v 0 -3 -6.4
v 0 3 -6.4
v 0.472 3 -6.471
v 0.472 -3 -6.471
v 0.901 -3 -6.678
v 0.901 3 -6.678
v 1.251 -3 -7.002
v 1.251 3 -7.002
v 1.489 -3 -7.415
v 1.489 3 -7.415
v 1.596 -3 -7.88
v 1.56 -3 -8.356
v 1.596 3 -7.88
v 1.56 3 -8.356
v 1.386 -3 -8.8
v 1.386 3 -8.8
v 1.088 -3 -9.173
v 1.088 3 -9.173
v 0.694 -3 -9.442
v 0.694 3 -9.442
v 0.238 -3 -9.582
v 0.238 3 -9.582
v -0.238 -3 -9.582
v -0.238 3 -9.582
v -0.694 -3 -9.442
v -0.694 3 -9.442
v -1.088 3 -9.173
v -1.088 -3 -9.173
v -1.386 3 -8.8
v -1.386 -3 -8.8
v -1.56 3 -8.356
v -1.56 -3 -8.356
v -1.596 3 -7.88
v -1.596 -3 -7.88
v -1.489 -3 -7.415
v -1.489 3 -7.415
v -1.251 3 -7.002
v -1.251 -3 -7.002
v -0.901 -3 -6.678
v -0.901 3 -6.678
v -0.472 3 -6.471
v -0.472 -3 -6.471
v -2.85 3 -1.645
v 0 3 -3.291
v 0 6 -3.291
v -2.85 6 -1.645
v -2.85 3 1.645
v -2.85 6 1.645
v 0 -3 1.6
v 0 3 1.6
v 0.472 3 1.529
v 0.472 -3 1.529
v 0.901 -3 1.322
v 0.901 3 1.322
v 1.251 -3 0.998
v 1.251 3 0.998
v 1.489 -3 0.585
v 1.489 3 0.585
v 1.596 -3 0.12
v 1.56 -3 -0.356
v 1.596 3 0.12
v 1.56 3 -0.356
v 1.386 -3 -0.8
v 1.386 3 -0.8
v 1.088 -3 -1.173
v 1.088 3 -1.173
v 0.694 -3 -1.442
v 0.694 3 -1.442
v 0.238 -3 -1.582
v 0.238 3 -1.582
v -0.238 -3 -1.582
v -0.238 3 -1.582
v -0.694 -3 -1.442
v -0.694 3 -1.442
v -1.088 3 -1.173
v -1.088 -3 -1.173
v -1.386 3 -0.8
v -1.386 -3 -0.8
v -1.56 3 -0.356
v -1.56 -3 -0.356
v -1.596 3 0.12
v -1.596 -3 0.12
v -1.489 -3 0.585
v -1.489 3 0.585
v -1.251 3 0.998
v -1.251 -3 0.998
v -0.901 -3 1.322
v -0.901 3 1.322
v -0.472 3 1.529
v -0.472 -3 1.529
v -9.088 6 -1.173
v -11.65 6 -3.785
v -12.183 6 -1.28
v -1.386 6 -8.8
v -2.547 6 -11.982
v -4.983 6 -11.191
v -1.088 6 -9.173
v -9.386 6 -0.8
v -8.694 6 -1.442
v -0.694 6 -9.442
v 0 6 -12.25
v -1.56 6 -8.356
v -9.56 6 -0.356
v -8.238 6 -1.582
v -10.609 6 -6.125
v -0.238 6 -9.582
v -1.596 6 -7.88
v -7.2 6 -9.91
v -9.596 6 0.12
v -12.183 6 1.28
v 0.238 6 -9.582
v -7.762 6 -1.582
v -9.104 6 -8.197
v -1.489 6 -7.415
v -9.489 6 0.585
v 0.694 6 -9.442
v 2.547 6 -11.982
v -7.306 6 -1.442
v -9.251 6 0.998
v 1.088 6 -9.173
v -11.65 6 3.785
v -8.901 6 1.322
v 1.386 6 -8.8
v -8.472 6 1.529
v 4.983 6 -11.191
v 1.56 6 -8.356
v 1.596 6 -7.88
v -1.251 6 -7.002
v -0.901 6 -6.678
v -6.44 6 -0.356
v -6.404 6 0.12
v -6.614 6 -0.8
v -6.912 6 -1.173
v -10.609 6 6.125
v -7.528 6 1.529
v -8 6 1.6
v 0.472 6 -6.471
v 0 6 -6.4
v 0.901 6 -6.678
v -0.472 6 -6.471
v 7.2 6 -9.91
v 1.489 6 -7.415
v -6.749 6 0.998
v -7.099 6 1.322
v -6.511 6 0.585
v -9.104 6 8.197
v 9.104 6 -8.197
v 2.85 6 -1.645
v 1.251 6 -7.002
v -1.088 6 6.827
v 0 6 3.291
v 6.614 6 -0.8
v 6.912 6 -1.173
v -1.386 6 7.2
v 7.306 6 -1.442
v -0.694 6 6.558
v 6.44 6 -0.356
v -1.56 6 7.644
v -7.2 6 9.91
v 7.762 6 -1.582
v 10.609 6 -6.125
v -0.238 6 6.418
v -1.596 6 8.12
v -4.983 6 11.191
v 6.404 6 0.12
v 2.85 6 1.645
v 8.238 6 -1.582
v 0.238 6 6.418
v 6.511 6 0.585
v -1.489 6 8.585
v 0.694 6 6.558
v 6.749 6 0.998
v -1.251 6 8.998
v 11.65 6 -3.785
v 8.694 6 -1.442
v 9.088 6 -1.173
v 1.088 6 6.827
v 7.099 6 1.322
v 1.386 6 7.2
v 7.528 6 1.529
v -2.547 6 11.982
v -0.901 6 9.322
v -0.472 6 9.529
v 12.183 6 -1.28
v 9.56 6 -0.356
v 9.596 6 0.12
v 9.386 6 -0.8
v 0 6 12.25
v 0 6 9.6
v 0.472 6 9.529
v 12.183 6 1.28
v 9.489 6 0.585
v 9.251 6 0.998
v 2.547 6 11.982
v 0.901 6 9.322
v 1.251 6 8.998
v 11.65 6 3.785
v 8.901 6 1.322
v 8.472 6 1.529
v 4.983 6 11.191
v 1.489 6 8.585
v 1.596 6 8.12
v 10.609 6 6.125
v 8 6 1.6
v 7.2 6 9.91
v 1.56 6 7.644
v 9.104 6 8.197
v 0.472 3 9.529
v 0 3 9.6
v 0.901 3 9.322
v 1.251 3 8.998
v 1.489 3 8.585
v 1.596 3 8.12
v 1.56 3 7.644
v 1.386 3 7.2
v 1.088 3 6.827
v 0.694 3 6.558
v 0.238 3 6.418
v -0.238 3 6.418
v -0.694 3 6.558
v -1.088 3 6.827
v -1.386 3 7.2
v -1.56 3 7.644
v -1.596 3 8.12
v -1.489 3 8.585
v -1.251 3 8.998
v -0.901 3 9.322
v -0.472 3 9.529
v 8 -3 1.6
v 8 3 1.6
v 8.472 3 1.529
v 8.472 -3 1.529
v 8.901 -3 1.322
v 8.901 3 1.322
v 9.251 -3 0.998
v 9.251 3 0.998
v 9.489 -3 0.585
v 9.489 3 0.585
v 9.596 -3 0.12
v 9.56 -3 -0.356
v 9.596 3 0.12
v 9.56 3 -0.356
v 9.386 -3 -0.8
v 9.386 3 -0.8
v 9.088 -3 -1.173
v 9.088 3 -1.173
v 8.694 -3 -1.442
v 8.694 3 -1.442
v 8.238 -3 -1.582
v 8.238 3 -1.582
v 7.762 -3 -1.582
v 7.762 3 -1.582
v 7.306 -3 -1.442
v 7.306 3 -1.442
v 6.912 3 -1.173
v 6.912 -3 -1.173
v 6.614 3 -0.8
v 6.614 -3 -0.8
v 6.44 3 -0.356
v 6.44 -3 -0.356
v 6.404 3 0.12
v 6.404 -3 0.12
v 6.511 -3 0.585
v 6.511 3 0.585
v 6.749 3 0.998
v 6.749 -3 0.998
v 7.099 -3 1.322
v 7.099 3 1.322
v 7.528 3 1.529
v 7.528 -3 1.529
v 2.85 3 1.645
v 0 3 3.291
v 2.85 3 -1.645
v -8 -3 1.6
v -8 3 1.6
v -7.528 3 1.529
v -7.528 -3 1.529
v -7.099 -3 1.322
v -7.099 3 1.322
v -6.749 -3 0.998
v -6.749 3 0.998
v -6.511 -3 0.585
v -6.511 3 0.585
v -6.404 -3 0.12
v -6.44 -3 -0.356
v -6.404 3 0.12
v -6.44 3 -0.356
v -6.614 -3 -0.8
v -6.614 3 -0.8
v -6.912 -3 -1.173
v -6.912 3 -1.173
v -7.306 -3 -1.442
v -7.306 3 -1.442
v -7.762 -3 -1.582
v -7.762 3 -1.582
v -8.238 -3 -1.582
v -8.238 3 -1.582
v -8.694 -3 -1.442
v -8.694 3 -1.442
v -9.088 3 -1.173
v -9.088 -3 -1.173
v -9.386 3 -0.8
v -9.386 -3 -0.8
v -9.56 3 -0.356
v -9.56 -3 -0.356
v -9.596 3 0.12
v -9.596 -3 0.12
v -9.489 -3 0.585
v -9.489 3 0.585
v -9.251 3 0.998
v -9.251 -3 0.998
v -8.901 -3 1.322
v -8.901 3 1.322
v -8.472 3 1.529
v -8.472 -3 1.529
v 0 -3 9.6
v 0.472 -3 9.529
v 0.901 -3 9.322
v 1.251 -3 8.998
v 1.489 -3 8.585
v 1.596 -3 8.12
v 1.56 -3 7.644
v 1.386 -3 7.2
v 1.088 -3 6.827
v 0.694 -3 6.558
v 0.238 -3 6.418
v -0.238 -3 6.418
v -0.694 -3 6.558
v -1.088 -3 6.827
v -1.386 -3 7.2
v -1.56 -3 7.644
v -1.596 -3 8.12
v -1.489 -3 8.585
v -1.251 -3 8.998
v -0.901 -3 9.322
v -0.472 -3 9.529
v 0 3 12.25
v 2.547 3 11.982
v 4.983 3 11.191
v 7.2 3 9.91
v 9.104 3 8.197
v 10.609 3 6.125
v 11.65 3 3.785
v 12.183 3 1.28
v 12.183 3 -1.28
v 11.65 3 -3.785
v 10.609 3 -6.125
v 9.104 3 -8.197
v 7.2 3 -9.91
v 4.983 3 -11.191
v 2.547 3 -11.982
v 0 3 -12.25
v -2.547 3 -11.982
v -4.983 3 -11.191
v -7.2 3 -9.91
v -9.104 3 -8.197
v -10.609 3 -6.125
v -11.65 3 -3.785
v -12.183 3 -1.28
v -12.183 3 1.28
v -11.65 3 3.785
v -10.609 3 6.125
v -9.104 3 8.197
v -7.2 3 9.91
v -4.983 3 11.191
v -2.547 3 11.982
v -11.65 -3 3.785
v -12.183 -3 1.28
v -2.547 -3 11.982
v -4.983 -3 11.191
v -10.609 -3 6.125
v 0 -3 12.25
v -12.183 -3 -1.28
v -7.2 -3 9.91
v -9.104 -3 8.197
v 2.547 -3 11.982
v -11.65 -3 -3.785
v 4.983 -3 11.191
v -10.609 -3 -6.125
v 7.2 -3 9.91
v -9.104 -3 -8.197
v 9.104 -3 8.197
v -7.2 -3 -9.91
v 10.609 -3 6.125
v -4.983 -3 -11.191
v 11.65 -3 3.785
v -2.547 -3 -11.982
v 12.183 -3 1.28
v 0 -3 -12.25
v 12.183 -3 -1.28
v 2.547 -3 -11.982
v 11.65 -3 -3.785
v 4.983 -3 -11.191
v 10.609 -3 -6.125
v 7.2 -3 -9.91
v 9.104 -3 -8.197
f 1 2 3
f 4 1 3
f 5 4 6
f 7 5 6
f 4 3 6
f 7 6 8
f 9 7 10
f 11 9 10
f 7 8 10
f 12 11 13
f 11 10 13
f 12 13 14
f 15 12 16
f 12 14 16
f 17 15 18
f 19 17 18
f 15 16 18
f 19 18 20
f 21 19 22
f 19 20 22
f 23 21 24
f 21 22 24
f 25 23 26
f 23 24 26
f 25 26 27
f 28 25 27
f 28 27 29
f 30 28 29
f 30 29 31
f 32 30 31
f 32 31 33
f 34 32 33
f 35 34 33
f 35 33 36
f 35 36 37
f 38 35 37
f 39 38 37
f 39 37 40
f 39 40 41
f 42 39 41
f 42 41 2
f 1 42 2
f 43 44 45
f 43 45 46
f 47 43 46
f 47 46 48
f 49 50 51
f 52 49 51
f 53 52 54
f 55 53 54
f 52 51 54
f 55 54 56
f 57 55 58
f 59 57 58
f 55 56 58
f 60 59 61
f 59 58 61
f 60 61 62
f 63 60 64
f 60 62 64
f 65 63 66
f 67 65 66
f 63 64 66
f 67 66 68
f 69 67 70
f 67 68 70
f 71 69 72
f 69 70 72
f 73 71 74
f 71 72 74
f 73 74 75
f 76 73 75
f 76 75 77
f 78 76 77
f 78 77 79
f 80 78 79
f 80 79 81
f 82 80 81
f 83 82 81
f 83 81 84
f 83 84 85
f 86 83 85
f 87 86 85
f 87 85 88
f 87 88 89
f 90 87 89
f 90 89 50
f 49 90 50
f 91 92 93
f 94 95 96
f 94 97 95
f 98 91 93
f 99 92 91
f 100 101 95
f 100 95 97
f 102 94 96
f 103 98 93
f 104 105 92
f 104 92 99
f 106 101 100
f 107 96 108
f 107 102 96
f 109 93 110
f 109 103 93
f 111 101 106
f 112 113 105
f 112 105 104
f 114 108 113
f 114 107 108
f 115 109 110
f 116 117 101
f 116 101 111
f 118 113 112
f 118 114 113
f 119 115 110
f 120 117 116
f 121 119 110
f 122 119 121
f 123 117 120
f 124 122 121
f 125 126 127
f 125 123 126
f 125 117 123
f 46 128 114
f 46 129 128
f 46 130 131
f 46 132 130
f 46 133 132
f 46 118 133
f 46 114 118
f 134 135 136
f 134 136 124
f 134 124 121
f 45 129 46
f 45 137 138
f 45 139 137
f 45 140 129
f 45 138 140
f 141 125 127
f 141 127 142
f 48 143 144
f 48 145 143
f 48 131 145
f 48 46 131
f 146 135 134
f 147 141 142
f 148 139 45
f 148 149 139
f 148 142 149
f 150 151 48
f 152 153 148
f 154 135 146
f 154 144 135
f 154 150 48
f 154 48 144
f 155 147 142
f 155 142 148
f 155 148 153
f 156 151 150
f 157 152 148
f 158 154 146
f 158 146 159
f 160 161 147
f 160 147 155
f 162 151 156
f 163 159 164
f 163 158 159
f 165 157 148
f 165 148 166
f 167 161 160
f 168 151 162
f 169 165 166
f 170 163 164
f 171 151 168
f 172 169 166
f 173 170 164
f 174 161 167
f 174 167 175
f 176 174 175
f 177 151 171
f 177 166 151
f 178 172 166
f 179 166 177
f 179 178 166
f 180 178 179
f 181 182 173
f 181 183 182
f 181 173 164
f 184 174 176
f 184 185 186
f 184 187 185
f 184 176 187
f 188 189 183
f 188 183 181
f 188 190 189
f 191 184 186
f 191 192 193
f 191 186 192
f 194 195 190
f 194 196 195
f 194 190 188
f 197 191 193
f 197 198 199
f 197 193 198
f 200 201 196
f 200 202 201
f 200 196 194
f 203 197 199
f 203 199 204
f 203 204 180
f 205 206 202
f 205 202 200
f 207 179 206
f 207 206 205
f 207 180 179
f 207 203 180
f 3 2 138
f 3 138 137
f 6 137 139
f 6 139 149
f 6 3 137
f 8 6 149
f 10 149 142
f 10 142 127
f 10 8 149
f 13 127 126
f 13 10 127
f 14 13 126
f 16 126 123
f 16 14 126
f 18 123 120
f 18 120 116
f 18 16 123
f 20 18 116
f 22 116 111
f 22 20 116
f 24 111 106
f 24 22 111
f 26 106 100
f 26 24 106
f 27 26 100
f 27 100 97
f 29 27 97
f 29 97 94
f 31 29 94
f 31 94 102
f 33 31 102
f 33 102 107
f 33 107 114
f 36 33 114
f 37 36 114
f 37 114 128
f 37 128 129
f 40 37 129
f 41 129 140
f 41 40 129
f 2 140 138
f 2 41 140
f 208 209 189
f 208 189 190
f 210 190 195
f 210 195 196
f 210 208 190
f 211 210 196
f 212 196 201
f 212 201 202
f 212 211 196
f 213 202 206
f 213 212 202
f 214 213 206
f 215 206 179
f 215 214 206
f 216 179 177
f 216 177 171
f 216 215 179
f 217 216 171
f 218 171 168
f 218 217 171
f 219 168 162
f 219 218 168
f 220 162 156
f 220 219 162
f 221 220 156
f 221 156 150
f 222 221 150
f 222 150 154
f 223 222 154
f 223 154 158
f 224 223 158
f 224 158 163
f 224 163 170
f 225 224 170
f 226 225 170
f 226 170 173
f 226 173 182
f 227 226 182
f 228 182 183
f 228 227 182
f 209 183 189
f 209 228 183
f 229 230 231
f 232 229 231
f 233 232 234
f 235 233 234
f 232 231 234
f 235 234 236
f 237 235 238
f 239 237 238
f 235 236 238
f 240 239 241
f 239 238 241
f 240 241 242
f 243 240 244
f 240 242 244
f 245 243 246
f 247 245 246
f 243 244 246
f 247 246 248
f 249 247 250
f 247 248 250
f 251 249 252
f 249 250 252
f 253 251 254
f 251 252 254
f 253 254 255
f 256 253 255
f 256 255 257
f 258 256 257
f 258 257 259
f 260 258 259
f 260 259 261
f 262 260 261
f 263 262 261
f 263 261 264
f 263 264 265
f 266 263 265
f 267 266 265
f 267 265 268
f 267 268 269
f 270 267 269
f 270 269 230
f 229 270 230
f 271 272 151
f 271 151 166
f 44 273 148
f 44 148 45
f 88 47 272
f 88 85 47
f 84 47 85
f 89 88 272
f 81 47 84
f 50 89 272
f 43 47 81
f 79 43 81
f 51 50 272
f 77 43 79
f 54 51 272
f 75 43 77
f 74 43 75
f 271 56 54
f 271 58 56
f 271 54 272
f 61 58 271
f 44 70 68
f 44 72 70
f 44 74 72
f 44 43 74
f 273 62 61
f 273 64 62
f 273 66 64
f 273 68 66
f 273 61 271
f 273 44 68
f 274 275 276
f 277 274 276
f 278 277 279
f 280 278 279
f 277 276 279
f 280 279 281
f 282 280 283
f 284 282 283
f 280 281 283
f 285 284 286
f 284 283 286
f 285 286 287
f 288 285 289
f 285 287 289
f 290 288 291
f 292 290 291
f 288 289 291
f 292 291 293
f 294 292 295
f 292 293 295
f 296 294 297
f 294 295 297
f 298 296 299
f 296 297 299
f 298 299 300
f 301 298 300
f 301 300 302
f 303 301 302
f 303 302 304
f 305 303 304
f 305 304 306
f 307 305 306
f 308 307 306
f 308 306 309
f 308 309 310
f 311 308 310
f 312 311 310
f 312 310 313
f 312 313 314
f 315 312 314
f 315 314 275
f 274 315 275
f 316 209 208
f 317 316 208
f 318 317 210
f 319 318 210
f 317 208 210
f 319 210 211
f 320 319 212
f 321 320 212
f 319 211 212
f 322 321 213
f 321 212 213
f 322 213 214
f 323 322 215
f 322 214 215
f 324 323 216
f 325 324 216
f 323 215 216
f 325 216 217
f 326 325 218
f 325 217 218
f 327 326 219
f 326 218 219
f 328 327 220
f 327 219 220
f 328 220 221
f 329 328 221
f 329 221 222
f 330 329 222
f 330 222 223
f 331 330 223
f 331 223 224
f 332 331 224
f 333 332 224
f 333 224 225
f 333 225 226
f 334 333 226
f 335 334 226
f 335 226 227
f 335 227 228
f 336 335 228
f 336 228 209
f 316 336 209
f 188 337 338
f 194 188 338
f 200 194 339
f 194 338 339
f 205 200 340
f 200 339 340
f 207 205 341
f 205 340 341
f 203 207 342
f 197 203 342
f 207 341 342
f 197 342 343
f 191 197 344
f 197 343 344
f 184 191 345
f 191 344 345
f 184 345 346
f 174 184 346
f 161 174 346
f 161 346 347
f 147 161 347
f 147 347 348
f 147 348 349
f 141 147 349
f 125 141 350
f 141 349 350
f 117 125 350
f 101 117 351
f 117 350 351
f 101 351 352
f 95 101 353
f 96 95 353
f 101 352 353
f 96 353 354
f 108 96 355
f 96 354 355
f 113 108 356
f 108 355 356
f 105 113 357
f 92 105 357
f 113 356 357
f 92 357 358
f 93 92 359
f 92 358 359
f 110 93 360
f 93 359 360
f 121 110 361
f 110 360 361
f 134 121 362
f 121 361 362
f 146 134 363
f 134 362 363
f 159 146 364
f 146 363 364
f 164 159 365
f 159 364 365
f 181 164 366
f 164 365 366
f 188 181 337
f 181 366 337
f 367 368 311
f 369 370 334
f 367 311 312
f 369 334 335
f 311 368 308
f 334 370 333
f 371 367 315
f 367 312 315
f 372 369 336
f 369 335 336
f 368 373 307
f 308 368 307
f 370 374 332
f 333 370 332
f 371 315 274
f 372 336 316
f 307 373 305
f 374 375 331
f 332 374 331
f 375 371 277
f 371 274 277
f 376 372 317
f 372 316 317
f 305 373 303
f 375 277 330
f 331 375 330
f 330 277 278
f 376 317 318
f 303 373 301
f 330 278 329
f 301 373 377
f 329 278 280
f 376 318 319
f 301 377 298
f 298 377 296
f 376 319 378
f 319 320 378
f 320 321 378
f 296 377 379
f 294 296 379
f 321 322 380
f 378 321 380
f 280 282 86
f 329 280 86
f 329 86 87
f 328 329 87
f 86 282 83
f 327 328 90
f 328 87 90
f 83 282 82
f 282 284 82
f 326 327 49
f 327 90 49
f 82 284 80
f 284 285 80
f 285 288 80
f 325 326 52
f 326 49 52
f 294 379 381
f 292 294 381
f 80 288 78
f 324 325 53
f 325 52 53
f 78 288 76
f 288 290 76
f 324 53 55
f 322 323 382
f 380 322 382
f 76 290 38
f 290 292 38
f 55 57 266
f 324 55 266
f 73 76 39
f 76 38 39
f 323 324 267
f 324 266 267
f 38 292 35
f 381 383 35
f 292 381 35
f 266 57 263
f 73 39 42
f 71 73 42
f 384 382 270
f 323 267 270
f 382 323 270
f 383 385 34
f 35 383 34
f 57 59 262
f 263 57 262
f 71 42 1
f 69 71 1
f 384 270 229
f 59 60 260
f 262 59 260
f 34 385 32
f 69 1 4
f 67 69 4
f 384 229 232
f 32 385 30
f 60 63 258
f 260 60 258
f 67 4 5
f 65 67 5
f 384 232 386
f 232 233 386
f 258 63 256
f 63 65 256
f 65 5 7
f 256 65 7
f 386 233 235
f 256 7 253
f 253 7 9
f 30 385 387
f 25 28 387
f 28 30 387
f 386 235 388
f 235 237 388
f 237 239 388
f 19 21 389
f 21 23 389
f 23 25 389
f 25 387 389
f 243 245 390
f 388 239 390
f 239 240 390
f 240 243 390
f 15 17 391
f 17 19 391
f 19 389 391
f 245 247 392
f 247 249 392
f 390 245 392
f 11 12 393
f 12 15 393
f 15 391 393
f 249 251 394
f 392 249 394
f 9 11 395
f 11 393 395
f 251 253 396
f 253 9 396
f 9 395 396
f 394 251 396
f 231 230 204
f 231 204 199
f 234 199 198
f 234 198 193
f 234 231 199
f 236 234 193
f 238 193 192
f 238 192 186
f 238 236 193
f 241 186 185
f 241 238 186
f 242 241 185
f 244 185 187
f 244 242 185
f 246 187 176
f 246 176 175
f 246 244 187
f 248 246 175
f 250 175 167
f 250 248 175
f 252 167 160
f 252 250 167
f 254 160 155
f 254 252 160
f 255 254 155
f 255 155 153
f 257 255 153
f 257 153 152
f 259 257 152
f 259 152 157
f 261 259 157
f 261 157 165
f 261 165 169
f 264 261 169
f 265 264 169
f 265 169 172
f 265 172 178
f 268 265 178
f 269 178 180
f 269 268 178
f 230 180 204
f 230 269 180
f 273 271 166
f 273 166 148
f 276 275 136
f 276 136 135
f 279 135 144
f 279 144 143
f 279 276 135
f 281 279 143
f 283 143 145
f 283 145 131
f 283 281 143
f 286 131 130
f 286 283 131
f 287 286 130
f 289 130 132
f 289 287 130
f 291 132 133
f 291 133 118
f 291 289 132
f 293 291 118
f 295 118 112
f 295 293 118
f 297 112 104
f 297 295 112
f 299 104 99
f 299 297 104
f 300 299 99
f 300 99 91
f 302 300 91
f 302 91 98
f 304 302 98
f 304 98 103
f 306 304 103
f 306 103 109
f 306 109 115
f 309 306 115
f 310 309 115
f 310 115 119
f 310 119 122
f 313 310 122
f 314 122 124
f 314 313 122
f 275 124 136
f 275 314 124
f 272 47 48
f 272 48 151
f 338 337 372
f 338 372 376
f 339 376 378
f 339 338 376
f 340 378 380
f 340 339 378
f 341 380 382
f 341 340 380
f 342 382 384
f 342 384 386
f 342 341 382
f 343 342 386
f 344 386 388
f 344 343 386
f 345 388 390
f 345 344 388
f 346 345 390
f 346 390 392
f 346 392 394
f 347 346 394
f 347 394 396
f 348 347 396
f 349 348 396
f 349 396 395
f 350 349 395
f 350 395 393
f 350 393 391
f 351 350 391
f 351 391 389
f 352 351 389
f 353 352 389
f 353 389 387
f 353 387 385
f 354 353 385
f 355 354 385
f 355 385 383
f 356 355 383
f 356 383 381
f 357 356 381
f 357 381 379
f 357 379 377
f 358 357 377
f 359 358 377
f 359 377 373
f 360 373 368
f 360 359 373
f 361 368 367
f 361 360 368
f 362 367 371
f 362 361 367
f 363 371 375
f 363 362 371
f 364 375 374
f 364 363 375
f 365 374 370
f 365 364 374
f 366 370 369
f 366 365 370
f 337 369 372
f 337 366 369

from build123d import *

# Parameters (mm, degrees)
SKETCH_1_R      = 12.25
SKETCH_1_R_2    = 1.6
EXTRUDE_1_DEPTH = 3
EXTRUDE_START   = 3
SKETCH_1_3_R    = 12.25
SKETCH_1_3_R_2  = 1.6
EXTRUDE_2_DEPTH = 3
SKETCH_1_4_R    = 1.6
EXTRUDE_3_DEPTH = 3
SKETCH_1_5_R    = 12.25
SKETCH_1_5_R_2  = 1.6
EXTRUDE_4_DEPTH = 3


with BuildPart() as part:
    # 草图1 → 凸台-拉伸1 (new body)
    # profile 1 of 2: a face of its own
    with BuildSketch(Plane(origin=(0, 0, 0), x_dir=(1, 0, 0), z_dir=(0, 1, 0))):
        with Locations(Location((0, 0, 0), (0, 0, 270))):
            Circle(SKETCH_1_R)
        with Locations(Location((-8, 0, 0), (0, 0, 270))):
            Circle(SKETCH_1_R_2, mode=Mode.SUBTRACT)
        with Locations(Location((0, -8, 0), (0, 0, 270))):
            Circle(SKETCH_1_R_2, mode=Mode.SUBTRACT)
        with Locations(Location((8, 0, 0), (0, 0, 270))):
            Circle(SKETCH_1_R_2, mode=Mode.SUBTRACT)
        with Locations(Location((0, 8, 0), (0, 0, 270))):
            Circle(SKETCH_1_R_2, mode=Mode.SUBTRACT)
        Polygon((-2.85, -1.645448267), (0, -3.290896534), (2.85, -1.645448267), (2.85, 1.645448267), (0, 3.290896534), (-2.85, 1.645448267), align=None, mode=Mode.SUBTRACT)
    # profile 2 of 2: a face of its own
    with BuildSketch(Plane(origin=(0, 0, 0), x_dir=(1, 0, 0), z_dir=(0, 1, 0))):
        Polygon((-2.85, 1.645448267), (-2.85, -1.645448267), (0, -3.290896534), (2.85, -1.645448267), (2.85, 1.645448267), (0, 3.290896534), align=None)
        with Locations(Location((0, 0, 0), (0, 0, 270))):
            Circle(SKETCH_1_R_2, mode=Mode.SUBTRACT)
    extrude(amount=-EXTRUDE_1_DEPTH)

    # 草图1<3> → 凸台-拉伸2 (add)
    with BuildSketch(Plane(origin=(0, 0, 0), x_dir=(1, 0, 0), z_dir=(0, 1, 0)).offset(EXTRUDE_START)):
        with Locations(Location((0, 0, 0), (0, 0, 270))):
            Circle(SKETCH_1_3_R)
        with Locations(Location((-8, 0, 0), (0, 0, 270))):
            Circle(SKETCH_1_3_R_2, mode=Mode.SUBTRACT)
        with Locations(Location((0, -8, 0), (0, 0, 270))):
            Circle(SKETCH_1_3_R_2, mode=Mode.SUBTRACT)
        with Locations(Location((8, 0, 0), (0, 0, 270))):
            Circle(SKETCH_1_3_R_2, mode=Mode.SUBTRACT)
        with Locations(Location((0, 8, 0), (0, 0, 270))):
            Circle(SKETCH_1_3_R_2, mode=Mode.SUBTRACT)
        Polygon((-2.85, -1.645448267), (0, -3.290896534), (2.85, -1.645448267), (2.85, 1.645448267), (0, 3.290896534), (-2.85, 1.645448267), align=None, mode=Mode.SUBTRACT)
    extrude(amount=-EXTRUDE_2_DEPTH)

    # 草图1<4> → 凸台-拉伸3 (add)
    with BuildSketch(Plane(origin=(0, 0, 0), x_dir=(1, 0, 0), z_dir=(0, 1, 0)).offset(EXTRUDE_START)):
        Polygon((-2.85, 1.645448267), (-2.85, -1.645448267), (0, -3.290896534), (2.85, -1.645448267), (2.85, 1.645448267), (0, 3.290896534), align=None)
        with Locations(Location((0, 0, 0), (0, 0, 270))):
            Circle(SKETCH_1_4_R, mode=Mode.SUBTRACT)
    extrude(amount=-EXTRUDE_3_DEPTH)

    # 草图1<5> → 凸台-拉伸4 (add)
    with BuildSketch(Plane(origin=(0, 0, 0), x_dir=(1, 0, 0), z_dir=(0, 1, 0)).offset(EXTRUDE_START)):
        with Locations(Location((0, 0, 0), (0, 0, 270))):
            Circle(SKETCH_1_5_R)
        with Locations(Location((-8, 0, 0), (0, 0, 270))):
            Circle(SKETCH_1_5_R_2, mode=Mode.SUBTRACT)
        with Locations(Location((0, -8, 0), (0, 0, 270))):
            Circle(SKETCH_1_5_R_2, mode=Mode.SUBTRACT)
        with Locations(Location((8, 0, 0), (0, 0, 270))):
            Circle(SKETCH_1_5_R_2, mode=Mode.SUBTRACT)
        with Locations(Location((0, 8, 0), (0, 0, 270))):
            Circle(SKETCH_1_5_R_2, mode=Mode.SUBTRACT)
        Polygon((-2.85, -1.645448267), (0, -3.290896534), (2.85, -1.645448267), (2.85, 1.645448267), (0, 3.290896534), (-2.85, 1.645448267), align=None, mode=Mode.SUBTRACT)
    extrude(amount=EXTRUDE_4_DEPTH)


solid = part.part
